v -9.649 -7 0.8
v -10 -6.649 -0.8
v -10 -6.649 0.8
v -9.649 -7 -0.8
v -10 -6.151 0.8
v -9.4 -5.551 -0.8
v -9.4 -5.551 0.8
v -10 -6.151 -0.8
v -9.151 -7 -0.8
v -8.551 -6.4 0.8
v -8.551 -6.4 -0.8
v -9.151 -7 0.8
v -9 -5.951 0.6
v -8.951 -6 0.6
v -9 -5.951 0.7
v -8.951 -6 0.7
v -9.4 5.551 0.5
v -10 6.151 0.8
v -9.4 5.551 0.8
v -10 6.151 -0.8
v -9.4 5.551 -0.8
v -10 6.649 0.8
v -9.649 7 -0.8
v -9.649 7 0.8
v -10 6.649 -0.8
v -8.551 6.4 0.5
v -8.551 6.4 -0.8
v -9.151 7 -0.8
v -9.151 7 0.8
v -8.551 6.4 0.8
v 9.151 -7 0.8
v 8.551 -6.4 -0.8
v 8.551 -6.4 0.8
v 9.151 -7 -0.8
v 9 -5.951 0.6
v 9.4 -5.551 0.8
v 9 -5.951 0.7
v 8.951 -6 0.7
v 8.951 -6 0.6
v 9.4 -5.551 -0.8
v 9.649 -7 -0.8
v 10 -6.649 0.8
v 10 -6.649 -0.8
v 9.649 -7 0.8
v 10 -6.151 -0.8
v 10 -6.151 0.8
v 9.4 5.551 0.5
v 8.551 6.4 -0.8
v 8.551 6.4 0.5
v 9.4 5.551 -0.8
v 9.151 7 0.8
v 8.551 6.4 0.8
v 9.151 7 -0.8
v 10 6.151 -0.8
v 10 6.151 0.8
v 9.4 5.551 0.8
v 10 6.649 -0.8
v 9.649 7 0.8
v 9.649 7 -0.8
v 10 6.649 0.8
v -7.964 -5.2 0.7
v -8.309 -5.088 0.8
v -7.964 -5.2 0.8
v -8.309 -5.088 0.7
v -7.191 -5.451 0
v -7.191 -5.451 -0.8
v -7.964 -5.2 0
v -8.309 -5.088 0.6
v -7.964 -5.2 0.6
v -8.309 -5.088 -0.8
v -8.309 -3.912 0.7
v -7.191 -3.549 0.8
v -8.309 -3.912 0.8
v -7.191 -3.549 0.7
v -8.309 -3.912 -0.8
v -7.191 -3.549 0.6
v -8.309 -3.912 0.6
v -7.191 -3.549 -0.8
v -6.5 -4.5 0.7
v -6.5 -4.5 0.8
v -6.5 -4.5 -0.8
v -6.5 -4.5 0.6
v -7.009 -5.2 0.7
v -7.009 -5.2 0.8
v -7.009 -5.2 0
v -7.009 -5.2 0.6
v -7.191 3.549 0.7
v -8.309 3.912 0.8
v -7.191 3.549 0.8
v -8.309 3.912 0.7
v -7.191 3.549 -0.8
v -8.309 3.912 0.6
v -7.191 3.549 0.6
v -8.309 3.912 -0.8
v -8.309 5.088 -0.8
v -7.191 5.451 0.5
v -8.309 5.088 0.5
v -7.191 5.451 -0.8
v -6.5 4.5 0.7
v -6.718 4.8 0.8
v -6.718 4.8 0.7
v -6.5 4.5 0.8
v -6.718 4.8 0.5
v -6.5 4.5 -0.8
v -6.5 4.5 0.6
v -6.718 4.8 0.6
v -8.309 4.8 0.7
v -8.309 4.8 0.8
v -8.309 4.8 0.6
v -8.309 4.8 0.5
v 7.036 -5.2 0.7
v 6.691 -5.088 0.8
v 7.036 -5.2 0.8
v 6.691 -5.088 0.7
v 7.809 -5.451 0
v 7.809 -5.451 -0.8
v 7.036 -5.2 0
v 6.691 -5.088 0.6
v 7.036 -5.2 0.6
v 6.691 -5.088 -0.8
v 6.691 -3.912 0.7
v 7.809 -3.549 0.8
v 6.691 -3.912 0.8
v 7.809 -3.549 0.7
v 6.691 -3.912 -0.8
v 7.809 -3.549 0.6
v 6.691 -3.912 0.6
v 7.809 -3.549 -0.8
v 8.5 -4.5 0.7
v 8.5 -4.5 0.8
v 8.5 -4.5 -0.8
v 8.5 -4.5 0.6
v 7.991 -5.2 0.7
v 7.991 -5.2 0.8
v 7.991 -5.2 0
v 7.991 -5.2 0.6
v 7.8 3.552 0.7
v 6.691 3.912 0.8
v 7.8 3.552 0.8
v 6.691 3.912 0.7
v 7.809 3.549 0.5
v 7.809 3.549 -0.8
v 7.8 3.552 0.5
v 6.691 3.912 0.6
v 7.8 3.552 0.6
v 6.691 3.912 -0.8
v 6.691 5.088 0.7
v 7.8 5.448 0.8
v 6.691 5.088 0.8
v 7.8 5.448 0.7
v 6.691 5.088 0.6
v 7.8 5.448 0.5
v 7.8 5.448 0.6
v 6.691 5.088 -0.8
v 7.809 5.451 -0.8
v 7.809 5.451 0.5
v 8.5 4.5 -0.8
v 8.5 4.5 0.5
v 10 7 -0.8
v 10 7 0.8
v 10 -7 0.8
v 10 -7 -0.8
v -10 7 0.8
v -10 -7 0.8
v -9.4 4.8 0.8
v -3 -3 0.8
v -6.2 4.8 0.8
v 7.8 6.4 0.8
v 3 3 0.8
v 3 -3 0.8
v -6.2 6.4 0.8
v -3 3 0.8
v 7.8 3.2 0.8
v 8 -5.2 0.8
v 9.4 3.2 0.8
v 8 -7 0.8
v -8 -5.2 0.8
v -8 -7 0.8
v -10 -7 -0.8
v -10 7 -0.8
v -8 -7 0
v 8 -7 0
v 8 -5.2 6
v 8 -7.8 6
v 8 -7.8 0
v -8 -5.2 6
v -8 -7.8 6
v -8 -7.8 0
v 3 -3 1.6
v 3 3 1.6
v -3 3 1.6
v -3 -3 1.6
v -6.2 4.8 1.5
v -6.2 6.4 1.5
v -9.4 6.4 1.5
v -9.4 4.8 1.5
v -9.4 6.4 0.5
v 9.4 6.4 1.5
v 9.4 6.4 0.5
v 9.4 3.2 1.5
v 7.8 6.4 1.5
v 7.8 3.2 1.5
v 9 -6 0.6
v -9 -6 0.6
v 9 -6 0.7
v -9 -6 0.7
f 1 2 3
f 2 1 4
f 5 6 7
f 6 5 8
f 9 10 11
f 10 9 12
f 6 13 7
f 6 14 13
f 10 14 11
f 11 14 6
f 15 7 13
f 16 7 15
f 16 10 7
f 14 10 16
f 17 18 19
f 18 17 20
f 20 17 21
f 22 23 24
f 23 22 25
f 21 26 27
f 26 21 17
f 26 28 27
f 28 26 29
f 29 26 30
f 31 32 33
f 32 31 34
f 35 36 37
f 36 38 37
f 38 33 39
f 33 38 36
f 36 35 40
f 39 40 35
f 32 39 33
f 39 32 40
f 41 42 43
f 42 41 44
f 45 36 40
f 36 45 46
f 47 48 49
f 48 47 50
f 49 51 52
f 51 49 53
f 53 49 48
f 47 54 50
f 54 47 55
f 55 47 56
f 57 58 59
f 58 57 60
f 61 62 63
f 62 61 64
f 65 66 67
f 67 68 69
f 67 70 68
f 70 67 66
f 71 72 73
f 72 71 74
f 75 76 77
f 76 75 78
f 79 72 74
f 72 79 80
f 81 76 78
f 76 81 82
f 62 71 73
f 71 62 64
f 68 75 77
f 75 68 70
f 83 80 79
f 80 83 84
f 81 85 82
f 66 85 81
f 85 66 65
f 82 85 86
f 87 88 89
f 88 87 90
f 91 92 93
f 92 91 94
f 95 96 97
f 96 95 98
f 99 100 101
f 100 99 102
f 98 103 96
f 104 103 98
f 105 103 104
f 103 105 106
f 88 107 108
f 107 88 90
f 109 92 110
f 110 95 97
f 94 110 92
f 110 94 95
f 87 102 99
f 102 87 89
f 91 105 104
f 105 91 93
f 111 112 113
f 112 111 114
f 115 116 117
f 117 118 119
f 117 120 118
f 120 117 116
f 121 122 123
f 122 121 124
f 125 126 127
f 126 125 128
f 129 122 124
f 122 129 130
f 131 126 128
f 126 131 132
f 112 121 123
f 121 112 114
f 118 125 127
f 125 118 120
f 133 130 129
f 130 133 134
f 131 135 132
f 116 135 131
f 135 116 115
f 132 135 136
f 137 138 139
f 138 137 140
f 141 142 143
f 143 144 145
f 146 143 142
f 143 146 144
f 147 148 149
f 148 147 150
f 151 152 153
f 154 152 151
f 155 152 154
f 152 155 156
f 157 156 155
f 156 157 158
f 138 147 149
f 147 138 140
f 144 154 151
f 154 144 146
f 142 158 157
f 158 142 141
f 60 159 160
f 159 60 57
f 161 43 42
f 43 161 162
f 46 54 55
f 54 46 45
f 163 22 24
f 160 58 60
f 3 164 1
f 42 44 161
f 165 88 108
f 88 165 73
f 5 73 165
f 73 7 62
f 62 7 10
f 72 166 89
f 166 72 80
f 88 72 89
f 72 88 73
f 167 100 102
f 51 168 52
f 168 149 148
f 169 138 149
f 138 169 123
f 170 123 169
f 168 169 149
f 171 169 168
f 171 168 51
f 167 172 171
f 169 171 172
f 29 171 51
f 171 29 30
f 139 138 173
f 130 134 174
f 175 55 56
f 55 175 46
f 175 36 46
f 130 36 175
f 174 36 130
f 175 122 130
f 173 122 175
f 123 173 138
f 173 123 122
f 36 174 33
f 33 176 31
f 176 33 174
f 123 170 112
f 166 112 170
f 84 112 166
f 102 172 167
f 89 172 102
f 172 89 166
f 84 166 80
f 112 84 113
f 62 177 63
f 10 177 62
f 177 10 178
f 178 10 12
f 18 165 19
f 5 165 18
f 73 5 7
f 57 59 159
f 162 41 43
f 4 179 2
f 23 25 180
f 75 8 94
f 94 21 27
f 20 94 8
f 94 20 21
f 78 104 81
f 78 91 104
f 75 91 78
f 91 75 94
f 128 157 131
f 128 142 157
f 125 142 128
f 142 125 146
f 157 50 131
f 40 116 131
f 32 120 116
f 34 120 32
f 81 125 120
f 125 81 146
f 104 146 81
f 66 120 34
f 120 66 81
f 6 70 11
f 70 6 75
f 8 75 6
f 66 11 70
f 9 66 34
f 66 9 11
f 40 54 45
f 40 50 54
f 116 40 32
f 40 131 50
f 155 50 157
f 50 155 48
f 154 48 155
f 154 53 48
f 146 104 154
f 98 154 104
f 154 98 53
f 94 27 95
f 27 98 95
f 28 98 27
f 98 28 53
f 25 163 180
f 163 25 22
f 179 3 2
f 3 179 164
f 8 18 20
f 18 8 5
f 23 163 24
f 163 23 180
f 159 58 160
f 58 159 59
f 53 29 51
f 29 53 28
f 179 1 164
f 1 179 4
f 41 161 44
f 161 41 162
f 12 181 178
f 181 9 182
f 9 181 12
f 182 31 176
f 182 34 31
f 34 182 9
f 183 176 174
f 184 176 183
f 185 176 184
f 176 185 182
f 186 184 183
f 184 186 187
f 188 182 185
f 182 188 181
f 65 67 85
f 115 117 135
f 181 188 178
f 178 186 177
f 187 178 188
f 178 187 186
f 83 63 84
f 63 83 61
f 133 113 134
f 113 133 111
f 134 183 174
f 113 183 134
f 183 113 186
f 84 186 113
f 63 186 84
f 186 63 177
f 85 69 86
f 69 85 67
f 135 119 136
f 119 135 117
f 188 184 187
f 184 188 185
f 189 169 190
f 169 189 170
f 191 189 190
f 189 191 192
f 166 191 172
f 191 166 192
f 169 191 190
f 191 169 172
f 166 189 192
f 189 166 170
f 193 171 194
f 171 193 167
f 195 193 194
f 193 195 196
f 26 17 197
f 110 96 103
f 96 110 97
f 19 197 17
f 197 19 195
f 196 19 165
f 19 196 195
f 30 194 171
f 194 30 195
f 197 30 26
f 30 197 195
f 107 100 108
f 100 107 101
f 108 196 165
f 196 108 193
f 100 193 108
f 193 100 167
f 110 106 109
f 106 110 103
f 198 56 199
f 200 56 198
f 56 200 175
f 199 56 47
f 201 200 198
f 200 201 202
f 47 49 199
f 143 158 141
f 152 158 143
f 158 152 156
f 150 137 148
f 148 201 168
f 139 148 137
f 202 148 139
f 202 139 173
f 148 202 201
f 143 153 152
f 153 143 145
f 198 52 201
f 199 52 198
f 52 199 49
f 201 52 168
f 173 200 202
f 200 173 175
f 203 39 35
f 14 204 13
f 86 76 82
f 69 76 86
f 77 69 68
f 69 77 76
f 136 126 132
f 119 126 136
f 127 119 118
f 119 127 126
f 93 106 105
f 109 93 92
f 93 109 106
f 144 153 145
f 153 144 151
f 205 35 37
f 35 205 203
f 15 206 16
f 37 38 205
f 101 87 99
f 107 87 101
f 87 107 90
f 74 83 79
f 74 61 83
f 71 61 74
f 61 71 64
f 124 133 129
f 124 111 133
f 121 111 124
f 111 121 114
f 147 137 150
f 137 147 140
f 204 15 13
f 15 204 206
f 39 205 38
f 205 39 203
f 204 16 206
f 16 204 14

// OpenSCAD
// Parameters
pcb_length = 20.0; //[10.0:40.0:0.5]
pcb_width = 14.0; //[7.0:28.0:0.5]
pcb_thickness = 1.6; //[0.8:3.2:0.1]
edge_chamfer = 0.6; //[0.3:1.2:0.1]
corner_cutout_height = 2.0; //[1.0:4.0:0.25]
mount_hole_diameter = 2.0; //[1.0:4.0:0.1]
mount_hole_edge_margin_x = 2.5; //[1.0:6.0:0.25]
mount_hole_edge_margin_y = 2.5; //[1.0:6.0:0.25]
hole_cut_extra_z = 0.6; //[0.2:2.0:0.1]
header_block_length = 16.0; //[8.0:32.0:0.5]
header_block_width = 2.6; //[2.0:6.0:0.1]
header_block_height = 6.0; //[3.0:12.0:0.5]
header_overlap = 0.8; //[0.3:1.6:0.1]
ic_length = 6.0; //[3.0:12.0:0.25]
ic_width = 6.0; //[3.0:12.0:0.25]
ic_height = 1.2; //[0.6:3.0:0.1]
ic_overlap = 0.4; //[0.2:1.0:0.1]
passive_length = 3.2; //[1.6:6.4:0.1]
passive_width = 1.6; //[0.8:3.2:0.1]
passive_height = 1.0; //[0.5:2.5:0.1]
passive_overlap = 0.3; //[0.2:0.8:0.1]
heatsink_pad_length = 8.0; //[4.0:16.0:0.5]
heatsink_pad_width = 8.0; //[4.0:16.0:0.5]
heatsink_pad_thickness = 0.2; //[0.05:0.6:0.05]
heatsink_pad_overlap = 0.2; //[0.1:0.6:0.05]
silkscreen_thickness = 0.1; //[0.05:0.3:0.05]
silkscreen_inset = 1.0; //[0.5:2.5:0.1]
silkscreen_overlap = 0.2; //[0.1:0.6:0.05]
copper_thickness = 0.05; //[0.02:0.2:0.01]
copper_overlap = 0.2; //[0.1:0.6:0.05]
trace_width = 0.8; //[0.3:2.0:0.1]
pad_size = 1.6; //[0.8:3.2:0.1]

// Main PCB Body
module pcb_main_body() {
  color([0.0, 0.4, 0.2]) // Green for PCB
  cube([pcb_length, pcb_width, pcb_thickness], center=true);
}

// Corner Cutouts for Chamfer
module corner_cutout() {
  cube([edge_chamfer*2, edge_chamfer*2, pcb_thickness + corner_cutout_height], center=true);
}

// Mounting Holes
module mounting_hole() {
  cylinder(r=mount_hole_diameter/2, h=pcb_thickness + hole_cut_extra_z, center=true);
}

// Pin Header Block
module pin_header_block() {
  color([0.85, 0.85, 0.8]) // Off-white for headers
  cube([header_block_length, header_block_width, header_block_height], center=true);
}

// Driver IC Package
module driver_ic_package() {
  color([0.1, 0.1, 0.12]) // Black for IC
  cube([ic_length, ic_width, ic_height], center=true);
}

// Passive Component
module passive_component(length, width, height) {
  color([0.85, 0.85, 0.8]) // Off-white for passive components
  cube([length, width, height], center=true);
}

// Heatsink Pad
module heatsink_pad() {
  color([0.75, 0.75, 0.77]) // Silver for heatsink
  cube([heatsink_pad_length, heatsink_pad_width, heatsink_pad_thickness], center=true);
}

// Silkscreen Markings
module silkscreen_frame() {
  color([1, 1, 1]) // White for silkscreen
  cube([pcb_length - silkscreen_inset*2, pcb_width - silkscreen_inset*2, silkscreen_thickness], center=true);
}

// Copper Pads and Traces
module copper_trace(length, width) {
  color([0.72, 0.45, 0.2]) // Copper color
  cube([length, width, copper_thickness], center=true);
}

module copper_pad() {
  color([0.72, 0.45, 0.2]) // Copper color
  cube([pad_size, pad_size, copper_thickness], center=true);
}

// Complete Model
difference() {
  pcb_main_body();
  // Apply corner cutouts
  for (x = [-1, 1], y = [-1, 1]) {
    translate([x * (pcb_length/2 - edge_chamfer), y * (pcb_width/2 - edge_chamfer), 0])
      rotate([0, 0, 45]) corner_cutout();
  }
  // Apply mounting holes
  for (x = [-1, 1], y = [-1, 1]) {
    translate([x * (pcb_length/2 - mount_hole_edge_margin_x), y * (pcb_width/2 - mount_hole_edge_margin_y), 0])
      mounting_hole();
  }
}

// Add components
union() {
  // Pin header
  translate([0, -pcb_width/2 + header_block_width/2 - header_overlap, pcb_thickness/2 + header_block_height/2 - header_overlap])
    pin_header_block();
  
  // Driver IC
  translate([0, 0, pcb_thickness/2 + ic_height/2 - ic_overlap])
    driver_ic_package();
  
  // Passive components
  translate([-pcb_length/2 + passive_length/2 + edge_chamfer, pcb_width/2 - passive_width/2 - edge_chamfer, pcb_thickness/2 + passive_height/2 - passive_overlap])
    passive_component(passive_length, passive_width, passive_height);
  
  translate([pcb_length/2 - passive_width/2 - edge_chamfer, pcb_width/2 - passive_length/2 - edge_chamfer, pcb_thickness/2 + passive_height/2 - passive_overlap])
    passive_component(passive_width, passive_length, passive_height);
  
  // Heatsink pad
  translate([0, 0, pcb_thickness/2 + heatsink_pad_thickness/2 - heatsink_pad_overlap])
    heatsink_pad();
  
  // Silkscreen frame
  translate([0, 0, pcb_thickness/2 + silkscreen_thickness/2 - silkscreen_overlap])
    silkscreen_frame();
  
  // Copper trace
  translate([0, 0, pcb_thickness/2 + copper_thickness/2 - copper_overlap])
    copper_trace(pcb_length - silkscreen_inset*2, trace_width);
  
  // Copper pads
  translate([-pcb_length/2 + silkscreen_inset + pad_size/2, -pcb_width/2 + silkscreen_inset + pad_size/2, pcb_thickness/2 + copper_thickness/2 - copper_overlap])
    copper_pad();
  
  translate([pcb_length/2 - silkscreen_inset - pad_size/2, -pcb_width/2 + silkscreen_inset + pad_size/2, pcb_thickness/2 + copper_thickness/2 - copper_overlap])
    copper_pad();
}
